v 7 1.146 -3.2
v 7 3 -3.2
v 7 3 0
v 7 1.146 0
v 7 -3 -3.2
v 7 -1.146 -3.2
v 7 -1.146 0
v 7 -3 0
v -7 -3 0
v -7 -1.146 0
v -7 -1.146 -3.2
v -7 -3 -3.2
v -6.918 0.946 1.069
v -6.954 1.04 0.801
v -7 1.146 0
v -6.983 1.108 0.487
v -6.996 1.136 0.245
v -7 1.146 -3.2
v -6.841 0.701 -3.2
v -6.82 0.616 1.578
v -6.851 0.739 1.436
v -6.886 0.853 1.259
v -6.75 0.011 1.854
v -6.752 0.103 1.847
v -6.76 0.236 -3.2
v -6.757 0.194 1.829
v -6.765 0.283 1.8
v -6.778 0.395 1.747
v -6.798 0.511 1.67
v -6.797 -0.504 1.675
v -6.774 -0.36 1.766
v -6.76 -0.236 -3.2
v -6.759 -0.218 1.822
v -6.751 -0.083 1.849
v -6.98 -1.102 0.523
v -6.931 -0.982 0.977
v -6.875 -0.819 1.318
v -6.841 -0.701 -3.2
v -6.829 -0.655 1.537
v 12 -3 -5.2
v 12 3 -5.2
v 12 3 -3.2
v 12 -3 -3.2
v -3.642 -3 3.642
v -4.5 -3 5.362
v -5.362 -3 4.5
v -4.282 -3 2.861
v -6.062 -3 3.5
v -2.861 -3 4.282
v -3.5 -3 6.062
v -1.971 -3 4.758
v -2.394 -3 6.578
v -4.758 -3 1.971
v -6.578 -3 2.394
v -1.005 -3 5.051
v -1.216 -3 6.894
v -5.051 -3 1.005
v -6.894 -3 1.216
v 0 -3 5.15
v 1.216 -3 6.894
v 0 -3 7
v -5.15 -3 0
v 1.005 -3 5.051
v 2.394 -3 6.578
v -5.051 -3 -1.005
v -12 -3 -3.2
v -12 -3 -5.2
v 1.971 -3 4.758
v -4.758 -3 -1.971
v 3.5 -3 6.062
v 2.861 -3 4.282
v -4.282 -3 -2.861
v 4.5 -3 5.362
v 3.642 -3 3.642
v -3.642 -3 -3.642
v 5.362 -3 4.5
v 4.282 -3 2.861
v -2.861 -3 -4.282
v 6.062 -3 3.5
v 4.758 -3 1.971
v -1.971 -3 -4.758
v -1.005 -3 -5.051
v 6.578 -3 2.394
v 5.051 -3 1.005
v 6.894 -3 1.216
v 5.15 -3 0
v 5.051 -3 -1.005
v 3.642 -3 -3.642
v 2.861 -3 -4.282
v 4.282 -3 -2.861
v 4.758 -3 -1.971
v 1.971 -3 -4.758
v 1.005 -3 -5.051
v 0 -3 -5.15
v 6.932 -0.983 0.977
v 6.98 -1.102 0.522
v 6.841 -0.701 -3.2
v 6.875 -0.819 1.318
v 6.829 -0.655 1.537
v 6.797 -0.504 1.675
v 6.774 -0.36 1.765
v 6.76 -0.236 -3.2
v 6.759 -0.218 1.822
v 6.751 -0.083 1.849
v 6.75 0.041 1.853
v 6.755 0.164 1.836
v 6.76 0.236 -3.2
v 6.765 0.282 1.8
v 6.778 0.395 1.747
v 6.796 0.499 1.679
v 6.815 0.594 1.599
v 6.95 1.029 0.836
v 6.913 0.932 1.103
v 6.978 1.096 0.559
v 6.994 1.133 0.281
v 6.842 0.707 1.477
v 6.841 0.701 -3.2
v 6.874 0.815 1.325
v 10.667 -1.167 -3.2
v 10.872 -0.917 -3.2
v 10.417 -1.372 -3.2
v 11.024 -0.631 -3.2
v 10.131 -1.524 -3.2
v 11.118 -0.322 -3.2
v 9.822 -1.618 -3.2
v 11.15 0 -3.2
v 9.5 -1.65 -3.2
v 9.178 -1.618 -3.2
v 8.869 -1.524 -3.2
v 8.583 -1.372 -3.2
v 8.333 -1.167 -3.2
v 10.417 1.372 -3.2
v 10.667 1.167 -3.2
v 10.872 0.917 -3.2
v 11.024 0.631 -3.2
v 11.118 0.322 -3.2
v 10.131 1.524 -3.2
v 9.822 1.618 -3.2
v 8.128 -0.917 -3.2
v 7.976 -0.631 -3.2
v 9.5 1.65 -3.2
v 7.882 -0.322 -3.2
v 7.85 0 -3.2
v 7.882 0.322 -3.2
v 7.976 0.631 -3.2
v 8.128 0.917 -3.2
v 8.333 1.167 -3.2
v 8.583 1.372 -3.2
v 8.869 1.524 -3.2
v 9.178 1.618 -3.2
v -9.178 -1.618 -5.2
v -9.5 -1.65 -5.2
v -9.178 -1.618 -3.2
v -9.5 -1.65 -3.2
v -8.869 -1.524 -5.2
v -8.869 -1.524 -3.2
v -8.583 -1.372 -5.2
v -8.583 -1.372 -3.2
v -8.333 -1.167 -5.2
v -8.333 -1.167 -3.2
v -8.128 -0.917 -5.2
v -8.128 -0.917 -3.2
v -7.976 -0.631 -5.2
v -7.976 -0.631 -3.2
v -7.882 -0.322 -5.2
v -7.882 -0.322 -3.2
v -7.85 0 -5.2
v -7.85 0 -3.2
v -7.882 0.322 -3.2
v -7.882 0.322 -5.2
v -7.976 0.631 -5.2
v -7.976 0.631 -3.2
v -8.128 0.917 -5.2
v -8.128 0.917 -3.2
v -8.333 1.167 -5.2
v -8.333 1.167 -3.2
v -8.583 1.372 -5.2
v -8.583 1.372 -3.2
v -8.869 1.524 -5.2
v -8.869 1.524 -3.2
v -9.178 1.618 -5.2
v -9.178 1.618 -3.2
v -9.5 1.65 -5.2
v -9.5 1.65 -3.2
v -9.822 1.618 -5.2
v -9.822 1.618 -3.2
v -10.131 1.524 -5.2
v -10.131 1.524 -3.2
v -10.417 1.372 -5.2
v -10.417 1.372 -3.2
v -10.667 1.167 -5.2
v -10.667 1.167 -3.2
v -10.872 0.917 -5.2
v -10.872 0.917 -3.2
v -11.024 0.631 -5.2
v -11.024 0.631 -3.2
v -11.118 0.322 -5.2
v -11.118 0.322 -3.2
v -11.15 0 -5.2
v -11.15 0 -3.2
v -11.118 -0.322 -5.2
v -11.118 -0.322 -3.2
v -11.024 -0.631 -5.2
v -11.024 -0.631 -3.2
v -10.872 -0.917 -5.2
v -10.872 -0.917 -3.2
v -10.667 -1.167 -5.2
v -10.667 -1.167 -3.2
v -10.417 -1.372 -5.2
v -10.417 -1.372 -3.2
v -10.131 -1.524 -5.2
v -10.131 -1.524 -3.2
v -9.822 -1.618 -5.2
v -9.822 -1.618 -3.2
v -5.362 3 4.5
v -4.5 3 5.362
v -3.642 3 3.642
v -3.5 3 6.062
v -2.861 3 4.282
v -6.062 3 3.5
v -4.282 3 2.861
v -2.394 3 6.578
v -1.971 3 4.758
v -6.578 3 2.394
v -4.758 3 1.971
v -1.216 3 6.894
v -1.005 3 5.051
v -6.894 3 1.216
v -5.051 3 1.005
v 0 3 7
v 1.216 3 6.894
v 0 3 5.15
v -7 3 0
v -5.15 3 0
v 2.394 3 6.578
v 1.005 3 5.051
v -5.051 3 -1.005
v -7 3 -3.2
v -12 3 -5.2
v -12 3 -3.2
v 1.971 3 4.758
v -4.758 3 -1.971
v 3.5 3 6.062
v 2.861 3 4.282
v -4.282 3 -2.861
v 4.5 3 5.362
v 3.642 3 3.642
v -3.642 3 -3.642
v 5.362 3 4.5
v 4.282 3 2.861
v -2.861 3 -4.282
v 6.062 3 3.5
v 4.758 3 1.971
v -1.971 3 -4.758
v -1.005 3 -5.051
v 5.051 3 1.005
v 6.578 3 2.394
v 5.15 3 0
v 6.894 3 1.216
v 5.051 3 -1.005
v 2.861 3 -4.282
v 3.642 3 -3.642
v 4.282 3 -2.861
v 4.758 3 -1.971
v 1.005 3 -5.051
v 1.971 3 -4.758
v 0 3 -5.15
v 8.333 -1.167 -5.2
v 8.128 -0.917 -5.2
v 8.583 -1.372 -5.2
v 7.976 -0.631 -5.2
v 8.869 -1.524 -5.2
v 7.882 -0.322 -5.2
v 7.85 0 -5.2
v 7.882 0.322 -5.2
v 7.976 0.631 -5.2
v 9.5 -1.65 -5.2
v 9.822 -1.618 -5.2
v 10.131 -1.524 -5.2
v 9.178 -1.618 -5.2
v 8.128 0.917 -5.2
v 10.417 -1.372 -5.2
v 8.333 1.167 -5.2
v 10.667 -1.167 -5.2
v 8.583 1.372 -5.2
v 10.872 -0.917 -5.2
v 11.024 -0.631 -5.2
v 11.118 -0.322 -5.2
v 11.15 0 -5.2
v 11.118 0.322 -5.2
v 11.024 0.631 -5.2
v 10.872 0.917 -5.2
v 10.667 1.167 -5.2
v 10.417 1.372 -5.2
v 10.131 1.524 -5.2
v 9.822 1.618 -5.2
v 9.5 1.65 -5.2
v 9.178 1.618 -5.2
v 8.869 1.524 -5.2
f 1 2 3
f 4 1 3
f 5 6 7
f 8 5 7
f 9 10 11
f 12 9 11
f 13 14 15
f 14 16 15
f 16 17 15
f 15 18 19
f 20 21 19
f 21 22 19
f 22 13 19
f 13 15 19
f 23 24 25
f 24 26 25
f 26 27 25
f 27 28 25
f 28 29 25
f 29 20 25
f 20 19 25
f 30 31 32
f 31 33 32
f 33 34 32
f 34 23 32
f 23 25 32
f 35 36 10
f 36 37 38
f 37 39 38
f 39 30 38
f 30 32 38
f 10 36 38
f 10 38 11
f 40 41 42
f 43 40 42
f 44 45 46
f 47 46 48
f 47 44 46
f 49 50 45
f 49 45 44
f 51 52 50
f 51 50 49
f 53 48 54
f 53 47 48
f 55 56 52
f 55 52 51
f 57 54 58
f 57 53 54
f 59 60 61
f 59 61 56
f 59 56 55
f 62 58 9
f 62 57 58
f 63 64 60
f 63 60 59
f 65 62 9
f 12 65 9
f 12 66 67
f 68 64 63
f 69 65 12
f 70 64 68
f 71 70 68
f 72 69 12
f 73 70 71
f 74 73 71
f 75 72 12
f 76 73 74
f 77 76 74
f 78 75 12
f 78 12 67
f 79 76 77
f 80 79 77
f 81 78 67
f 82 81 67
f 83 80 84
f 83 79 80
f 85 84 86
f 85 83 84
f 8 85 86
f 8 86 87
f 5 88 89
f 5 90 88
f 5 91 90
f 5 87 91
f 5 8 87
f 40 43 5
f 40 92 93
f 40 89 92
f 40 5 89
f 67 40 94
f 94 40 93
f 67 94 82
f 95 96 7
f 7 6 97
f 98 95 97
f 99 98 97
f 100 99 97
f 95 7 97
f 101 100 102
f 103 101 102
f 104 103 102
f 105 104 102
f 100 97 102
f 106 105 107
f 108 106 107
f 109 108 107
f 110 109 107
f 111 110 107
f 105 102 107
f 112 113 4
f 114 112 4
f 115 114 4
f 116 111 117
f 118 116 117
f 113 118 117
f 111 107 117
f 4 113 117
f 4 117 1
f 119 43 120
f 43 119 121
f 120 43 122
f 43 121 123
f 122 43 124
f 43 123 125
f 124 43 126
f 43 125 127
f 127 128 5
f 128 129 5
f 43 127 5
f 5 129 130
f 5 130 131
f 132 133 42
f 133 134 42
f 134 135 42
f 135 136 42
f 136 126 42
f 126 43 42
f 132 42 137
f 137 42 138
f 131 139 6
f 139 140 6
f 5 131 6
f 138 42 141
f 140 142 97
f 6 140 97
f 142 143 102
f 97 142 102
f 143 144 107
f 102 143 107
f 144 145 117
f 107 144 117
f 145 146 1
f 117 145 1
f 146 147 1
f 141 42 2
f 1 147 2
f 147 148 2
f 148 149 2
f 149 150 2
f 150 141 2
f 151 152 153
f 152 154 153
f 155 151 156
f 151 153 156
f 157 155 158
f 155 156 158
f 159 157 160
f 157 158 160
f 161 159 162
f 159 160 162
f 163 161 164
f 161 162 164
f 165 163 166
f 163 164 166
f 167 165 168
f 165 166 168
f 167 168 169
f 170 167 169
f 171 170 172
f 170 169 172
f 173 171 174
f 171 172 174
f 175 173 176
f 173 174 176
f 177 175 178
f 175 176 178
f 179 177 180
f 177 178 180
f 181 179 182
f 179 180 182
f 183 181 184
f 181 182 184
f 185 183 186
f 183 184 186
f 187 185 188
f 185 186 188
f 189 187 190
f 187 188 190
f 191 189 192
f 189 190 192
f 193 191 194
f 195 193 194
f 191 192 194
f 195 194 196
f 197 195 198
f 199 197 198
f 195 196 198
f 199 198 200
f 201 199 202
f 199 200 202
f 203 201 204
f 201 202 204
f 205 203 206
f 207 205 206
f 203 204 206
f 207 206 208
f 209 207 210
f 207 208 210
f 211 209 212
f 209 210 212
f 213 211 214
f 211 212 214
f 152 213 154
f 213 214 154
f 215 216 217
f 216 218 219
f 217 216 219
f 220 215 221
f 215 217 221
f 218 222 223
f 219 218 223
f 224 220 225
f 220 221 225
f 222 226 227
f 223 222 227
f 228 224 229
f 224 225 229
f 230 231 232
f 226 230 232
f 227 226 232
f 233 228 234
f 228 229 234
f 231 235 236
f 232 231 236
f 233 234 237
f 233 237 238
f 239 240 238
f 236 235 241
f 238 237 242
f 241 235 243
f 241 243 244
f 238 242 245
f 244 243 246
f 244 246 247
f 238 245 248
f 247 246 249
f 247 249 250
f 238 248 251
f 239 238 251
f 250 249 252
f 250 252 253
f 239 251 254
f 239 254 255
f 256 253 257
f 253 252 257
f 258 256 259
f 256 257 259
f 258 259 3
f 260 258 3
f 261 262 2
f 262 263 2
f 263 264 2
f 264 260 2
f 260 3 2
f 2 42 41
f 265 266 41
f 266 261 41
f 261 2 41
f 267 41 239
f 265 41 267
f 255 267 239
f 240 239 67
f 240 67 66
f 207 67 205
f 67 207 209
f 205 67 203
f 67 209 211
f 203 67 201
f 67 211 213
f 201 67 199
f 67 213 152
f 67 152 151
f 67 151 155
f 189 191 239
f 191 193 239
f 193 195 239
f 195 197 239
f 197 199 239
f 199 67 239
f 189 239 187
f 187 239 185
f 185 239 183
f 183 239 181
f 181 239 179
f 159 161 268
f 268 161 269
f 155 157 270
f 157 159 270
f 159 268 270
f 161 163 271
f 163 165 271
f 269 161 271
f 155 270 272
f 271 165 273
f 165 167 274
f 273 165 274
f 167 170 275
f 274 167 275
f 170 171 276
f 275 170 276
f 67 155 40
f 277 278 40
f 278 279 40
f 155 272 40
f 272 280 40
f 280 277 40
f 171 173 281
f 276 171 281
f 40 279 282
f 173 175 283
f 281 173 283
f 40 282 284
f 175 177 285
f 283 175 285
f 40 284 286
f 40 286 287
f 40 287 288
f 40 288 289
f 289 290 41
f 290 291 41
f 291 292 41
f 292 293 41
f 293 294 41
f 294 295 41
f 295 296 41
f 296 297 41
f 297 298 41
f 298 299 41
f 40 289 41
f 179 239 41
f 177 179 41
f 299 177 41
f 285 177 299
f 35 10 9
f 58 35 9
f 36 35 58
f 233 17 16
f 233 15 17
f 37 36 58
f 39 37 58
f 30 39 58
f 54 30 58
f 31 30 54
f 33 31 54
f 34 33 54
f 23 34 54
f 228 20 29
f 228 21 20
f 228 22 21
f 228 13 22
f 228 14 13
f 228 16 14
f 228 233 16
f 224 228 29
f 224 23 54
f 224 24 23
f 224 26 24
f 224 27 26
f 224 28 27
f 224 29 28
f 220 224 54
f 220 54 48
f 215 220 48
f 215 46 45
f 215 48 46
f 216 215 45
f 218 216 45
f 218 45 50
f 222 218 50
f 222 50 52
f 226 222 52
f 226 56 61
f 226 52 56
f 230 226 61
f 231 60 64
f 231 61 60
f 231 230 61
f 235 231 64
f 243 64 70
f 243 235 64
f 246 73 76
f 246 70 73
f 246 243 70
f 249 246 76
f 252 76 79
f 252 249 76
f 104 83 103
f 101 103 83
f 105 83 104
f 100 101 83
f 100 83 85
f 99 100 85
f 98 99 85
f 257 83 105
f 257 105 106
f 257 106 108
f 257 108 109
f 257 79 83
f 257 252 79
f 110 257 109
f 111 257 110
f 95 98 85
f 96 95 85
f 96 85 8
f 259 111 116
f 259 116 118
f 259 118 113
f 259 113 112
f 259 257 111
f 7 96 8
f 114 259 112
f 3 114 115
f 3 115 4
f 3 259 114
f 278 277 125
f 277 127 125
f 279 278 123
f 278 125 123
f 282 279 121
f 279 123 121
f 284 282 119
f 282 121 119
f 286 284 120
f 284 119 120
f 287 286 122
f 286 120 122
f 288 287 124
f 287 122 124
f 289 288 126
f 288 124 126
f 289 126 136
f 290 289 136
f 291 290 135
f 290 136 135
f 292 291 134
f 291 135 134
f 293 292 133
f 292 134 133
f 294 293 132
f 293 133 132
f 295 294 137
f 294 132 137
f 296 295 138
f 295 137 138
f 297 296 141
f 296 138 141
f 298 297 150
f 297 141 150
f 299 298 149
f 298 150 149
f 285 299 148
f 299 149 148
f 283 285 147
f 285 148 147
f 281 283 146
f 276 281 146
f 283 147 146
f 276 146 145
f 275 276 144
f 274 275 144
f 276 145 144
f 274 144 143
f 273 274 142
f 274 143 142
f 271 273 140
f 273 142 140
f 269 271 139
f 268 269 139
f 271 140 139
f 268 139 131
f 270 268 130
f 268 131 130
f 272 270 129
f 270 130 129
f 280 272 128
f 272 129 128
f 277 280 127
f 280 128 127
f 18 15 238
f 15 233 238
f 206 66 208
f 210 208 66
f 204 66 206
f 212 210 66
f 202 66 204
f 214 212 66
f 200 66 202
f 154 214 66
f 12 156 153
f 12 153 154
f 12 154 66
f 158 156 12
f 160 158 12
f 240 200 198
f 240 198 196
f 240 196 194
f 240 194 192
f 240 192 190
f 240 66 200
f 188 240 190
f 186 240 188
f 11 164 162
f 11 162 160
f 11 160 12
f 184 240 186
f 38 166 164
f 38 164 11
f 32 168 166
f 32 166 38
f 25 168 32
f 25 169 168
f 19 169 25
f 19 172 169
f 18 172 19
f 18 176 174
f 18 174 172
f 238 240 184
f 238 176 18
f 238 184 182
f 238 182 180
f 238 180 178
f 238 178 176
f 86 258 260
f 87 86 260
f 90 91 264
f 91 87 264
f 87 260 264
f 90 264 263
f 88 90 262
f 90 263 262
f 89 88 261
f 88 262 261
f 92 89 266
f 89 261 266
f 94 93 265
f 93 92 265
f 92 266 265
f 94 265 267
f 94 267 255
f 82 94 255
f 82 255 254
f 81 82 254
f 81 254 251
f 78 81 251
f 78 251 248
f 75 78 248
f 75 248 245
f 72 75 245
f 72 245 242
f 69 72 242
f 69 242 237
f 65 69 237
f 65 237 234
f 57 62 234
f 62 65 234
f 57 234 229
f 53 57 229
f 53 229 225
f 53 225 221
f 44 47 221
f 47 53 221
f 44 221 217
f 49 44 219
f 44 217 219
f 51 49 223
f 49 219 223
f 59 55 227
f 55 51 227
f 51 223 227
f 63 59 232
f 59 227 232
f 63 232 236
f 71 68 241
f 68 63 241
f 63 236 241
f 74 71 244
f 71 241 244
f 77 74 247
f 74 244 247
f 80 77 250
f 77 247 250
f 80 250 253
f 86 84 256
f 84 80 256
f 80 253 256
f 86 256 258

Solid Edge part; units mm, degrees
sketch "Sketch1" plane through (0, 0, 0) normal (0, -1, 0) x (1, 0, 0)
  circle A0 centre (0, 0) radius 5.15
  line L0 (-12, -5.2) -> (12, -5.2)
  line L1 (12, -5.2) -> (12, -3.2)
  line L2 (12, -3.2) -> (7, -3.2)
  line L3 (7, -3.2) -> (7, 0)
  arc A1 (7, 0) -> (-7, 0) centre (0, 0) ccw
  line L4 (-7, 0) -> (-7, -3.2)
  line L5 (-12, -3.2) -> (-7, -3.2)
  line L6 (-12, -5.2) -> (-12, -3.2)
  dimension "D1" = 14
  dimension "D2" = 2
  dimension "D3" = 24
  dimension "D4" = 2
  dimension "D5" = 10.3
  dimension "D6" = 3.2
extrude "Protrusion1" add sketch "Sketch1" along normal mid plane 6
hole "Hole1" at (-9.5, 0, -3.2) direction (0, 0, -1) diameter 3.3 end up to next
hole "Hole2" at (9.5, 0, -3.2) direction (0, 0, -1) diameter 3.3 end up to next
sketch "Sketch2" plane through (9.5, 0, -3.2) normal (0, 0, 1) x (-1, 0, 0)
  circle A0 centre (19, 0) radius 2.75
  circle A1 centre (0, 0) radius 2.75
  dimension "D1" = 5.5
  dimension "D2" = 5.5
extrude "Cutout1" cut sketch "Sketch2" along normal up to next
properties material "ABS, alto impacto"
